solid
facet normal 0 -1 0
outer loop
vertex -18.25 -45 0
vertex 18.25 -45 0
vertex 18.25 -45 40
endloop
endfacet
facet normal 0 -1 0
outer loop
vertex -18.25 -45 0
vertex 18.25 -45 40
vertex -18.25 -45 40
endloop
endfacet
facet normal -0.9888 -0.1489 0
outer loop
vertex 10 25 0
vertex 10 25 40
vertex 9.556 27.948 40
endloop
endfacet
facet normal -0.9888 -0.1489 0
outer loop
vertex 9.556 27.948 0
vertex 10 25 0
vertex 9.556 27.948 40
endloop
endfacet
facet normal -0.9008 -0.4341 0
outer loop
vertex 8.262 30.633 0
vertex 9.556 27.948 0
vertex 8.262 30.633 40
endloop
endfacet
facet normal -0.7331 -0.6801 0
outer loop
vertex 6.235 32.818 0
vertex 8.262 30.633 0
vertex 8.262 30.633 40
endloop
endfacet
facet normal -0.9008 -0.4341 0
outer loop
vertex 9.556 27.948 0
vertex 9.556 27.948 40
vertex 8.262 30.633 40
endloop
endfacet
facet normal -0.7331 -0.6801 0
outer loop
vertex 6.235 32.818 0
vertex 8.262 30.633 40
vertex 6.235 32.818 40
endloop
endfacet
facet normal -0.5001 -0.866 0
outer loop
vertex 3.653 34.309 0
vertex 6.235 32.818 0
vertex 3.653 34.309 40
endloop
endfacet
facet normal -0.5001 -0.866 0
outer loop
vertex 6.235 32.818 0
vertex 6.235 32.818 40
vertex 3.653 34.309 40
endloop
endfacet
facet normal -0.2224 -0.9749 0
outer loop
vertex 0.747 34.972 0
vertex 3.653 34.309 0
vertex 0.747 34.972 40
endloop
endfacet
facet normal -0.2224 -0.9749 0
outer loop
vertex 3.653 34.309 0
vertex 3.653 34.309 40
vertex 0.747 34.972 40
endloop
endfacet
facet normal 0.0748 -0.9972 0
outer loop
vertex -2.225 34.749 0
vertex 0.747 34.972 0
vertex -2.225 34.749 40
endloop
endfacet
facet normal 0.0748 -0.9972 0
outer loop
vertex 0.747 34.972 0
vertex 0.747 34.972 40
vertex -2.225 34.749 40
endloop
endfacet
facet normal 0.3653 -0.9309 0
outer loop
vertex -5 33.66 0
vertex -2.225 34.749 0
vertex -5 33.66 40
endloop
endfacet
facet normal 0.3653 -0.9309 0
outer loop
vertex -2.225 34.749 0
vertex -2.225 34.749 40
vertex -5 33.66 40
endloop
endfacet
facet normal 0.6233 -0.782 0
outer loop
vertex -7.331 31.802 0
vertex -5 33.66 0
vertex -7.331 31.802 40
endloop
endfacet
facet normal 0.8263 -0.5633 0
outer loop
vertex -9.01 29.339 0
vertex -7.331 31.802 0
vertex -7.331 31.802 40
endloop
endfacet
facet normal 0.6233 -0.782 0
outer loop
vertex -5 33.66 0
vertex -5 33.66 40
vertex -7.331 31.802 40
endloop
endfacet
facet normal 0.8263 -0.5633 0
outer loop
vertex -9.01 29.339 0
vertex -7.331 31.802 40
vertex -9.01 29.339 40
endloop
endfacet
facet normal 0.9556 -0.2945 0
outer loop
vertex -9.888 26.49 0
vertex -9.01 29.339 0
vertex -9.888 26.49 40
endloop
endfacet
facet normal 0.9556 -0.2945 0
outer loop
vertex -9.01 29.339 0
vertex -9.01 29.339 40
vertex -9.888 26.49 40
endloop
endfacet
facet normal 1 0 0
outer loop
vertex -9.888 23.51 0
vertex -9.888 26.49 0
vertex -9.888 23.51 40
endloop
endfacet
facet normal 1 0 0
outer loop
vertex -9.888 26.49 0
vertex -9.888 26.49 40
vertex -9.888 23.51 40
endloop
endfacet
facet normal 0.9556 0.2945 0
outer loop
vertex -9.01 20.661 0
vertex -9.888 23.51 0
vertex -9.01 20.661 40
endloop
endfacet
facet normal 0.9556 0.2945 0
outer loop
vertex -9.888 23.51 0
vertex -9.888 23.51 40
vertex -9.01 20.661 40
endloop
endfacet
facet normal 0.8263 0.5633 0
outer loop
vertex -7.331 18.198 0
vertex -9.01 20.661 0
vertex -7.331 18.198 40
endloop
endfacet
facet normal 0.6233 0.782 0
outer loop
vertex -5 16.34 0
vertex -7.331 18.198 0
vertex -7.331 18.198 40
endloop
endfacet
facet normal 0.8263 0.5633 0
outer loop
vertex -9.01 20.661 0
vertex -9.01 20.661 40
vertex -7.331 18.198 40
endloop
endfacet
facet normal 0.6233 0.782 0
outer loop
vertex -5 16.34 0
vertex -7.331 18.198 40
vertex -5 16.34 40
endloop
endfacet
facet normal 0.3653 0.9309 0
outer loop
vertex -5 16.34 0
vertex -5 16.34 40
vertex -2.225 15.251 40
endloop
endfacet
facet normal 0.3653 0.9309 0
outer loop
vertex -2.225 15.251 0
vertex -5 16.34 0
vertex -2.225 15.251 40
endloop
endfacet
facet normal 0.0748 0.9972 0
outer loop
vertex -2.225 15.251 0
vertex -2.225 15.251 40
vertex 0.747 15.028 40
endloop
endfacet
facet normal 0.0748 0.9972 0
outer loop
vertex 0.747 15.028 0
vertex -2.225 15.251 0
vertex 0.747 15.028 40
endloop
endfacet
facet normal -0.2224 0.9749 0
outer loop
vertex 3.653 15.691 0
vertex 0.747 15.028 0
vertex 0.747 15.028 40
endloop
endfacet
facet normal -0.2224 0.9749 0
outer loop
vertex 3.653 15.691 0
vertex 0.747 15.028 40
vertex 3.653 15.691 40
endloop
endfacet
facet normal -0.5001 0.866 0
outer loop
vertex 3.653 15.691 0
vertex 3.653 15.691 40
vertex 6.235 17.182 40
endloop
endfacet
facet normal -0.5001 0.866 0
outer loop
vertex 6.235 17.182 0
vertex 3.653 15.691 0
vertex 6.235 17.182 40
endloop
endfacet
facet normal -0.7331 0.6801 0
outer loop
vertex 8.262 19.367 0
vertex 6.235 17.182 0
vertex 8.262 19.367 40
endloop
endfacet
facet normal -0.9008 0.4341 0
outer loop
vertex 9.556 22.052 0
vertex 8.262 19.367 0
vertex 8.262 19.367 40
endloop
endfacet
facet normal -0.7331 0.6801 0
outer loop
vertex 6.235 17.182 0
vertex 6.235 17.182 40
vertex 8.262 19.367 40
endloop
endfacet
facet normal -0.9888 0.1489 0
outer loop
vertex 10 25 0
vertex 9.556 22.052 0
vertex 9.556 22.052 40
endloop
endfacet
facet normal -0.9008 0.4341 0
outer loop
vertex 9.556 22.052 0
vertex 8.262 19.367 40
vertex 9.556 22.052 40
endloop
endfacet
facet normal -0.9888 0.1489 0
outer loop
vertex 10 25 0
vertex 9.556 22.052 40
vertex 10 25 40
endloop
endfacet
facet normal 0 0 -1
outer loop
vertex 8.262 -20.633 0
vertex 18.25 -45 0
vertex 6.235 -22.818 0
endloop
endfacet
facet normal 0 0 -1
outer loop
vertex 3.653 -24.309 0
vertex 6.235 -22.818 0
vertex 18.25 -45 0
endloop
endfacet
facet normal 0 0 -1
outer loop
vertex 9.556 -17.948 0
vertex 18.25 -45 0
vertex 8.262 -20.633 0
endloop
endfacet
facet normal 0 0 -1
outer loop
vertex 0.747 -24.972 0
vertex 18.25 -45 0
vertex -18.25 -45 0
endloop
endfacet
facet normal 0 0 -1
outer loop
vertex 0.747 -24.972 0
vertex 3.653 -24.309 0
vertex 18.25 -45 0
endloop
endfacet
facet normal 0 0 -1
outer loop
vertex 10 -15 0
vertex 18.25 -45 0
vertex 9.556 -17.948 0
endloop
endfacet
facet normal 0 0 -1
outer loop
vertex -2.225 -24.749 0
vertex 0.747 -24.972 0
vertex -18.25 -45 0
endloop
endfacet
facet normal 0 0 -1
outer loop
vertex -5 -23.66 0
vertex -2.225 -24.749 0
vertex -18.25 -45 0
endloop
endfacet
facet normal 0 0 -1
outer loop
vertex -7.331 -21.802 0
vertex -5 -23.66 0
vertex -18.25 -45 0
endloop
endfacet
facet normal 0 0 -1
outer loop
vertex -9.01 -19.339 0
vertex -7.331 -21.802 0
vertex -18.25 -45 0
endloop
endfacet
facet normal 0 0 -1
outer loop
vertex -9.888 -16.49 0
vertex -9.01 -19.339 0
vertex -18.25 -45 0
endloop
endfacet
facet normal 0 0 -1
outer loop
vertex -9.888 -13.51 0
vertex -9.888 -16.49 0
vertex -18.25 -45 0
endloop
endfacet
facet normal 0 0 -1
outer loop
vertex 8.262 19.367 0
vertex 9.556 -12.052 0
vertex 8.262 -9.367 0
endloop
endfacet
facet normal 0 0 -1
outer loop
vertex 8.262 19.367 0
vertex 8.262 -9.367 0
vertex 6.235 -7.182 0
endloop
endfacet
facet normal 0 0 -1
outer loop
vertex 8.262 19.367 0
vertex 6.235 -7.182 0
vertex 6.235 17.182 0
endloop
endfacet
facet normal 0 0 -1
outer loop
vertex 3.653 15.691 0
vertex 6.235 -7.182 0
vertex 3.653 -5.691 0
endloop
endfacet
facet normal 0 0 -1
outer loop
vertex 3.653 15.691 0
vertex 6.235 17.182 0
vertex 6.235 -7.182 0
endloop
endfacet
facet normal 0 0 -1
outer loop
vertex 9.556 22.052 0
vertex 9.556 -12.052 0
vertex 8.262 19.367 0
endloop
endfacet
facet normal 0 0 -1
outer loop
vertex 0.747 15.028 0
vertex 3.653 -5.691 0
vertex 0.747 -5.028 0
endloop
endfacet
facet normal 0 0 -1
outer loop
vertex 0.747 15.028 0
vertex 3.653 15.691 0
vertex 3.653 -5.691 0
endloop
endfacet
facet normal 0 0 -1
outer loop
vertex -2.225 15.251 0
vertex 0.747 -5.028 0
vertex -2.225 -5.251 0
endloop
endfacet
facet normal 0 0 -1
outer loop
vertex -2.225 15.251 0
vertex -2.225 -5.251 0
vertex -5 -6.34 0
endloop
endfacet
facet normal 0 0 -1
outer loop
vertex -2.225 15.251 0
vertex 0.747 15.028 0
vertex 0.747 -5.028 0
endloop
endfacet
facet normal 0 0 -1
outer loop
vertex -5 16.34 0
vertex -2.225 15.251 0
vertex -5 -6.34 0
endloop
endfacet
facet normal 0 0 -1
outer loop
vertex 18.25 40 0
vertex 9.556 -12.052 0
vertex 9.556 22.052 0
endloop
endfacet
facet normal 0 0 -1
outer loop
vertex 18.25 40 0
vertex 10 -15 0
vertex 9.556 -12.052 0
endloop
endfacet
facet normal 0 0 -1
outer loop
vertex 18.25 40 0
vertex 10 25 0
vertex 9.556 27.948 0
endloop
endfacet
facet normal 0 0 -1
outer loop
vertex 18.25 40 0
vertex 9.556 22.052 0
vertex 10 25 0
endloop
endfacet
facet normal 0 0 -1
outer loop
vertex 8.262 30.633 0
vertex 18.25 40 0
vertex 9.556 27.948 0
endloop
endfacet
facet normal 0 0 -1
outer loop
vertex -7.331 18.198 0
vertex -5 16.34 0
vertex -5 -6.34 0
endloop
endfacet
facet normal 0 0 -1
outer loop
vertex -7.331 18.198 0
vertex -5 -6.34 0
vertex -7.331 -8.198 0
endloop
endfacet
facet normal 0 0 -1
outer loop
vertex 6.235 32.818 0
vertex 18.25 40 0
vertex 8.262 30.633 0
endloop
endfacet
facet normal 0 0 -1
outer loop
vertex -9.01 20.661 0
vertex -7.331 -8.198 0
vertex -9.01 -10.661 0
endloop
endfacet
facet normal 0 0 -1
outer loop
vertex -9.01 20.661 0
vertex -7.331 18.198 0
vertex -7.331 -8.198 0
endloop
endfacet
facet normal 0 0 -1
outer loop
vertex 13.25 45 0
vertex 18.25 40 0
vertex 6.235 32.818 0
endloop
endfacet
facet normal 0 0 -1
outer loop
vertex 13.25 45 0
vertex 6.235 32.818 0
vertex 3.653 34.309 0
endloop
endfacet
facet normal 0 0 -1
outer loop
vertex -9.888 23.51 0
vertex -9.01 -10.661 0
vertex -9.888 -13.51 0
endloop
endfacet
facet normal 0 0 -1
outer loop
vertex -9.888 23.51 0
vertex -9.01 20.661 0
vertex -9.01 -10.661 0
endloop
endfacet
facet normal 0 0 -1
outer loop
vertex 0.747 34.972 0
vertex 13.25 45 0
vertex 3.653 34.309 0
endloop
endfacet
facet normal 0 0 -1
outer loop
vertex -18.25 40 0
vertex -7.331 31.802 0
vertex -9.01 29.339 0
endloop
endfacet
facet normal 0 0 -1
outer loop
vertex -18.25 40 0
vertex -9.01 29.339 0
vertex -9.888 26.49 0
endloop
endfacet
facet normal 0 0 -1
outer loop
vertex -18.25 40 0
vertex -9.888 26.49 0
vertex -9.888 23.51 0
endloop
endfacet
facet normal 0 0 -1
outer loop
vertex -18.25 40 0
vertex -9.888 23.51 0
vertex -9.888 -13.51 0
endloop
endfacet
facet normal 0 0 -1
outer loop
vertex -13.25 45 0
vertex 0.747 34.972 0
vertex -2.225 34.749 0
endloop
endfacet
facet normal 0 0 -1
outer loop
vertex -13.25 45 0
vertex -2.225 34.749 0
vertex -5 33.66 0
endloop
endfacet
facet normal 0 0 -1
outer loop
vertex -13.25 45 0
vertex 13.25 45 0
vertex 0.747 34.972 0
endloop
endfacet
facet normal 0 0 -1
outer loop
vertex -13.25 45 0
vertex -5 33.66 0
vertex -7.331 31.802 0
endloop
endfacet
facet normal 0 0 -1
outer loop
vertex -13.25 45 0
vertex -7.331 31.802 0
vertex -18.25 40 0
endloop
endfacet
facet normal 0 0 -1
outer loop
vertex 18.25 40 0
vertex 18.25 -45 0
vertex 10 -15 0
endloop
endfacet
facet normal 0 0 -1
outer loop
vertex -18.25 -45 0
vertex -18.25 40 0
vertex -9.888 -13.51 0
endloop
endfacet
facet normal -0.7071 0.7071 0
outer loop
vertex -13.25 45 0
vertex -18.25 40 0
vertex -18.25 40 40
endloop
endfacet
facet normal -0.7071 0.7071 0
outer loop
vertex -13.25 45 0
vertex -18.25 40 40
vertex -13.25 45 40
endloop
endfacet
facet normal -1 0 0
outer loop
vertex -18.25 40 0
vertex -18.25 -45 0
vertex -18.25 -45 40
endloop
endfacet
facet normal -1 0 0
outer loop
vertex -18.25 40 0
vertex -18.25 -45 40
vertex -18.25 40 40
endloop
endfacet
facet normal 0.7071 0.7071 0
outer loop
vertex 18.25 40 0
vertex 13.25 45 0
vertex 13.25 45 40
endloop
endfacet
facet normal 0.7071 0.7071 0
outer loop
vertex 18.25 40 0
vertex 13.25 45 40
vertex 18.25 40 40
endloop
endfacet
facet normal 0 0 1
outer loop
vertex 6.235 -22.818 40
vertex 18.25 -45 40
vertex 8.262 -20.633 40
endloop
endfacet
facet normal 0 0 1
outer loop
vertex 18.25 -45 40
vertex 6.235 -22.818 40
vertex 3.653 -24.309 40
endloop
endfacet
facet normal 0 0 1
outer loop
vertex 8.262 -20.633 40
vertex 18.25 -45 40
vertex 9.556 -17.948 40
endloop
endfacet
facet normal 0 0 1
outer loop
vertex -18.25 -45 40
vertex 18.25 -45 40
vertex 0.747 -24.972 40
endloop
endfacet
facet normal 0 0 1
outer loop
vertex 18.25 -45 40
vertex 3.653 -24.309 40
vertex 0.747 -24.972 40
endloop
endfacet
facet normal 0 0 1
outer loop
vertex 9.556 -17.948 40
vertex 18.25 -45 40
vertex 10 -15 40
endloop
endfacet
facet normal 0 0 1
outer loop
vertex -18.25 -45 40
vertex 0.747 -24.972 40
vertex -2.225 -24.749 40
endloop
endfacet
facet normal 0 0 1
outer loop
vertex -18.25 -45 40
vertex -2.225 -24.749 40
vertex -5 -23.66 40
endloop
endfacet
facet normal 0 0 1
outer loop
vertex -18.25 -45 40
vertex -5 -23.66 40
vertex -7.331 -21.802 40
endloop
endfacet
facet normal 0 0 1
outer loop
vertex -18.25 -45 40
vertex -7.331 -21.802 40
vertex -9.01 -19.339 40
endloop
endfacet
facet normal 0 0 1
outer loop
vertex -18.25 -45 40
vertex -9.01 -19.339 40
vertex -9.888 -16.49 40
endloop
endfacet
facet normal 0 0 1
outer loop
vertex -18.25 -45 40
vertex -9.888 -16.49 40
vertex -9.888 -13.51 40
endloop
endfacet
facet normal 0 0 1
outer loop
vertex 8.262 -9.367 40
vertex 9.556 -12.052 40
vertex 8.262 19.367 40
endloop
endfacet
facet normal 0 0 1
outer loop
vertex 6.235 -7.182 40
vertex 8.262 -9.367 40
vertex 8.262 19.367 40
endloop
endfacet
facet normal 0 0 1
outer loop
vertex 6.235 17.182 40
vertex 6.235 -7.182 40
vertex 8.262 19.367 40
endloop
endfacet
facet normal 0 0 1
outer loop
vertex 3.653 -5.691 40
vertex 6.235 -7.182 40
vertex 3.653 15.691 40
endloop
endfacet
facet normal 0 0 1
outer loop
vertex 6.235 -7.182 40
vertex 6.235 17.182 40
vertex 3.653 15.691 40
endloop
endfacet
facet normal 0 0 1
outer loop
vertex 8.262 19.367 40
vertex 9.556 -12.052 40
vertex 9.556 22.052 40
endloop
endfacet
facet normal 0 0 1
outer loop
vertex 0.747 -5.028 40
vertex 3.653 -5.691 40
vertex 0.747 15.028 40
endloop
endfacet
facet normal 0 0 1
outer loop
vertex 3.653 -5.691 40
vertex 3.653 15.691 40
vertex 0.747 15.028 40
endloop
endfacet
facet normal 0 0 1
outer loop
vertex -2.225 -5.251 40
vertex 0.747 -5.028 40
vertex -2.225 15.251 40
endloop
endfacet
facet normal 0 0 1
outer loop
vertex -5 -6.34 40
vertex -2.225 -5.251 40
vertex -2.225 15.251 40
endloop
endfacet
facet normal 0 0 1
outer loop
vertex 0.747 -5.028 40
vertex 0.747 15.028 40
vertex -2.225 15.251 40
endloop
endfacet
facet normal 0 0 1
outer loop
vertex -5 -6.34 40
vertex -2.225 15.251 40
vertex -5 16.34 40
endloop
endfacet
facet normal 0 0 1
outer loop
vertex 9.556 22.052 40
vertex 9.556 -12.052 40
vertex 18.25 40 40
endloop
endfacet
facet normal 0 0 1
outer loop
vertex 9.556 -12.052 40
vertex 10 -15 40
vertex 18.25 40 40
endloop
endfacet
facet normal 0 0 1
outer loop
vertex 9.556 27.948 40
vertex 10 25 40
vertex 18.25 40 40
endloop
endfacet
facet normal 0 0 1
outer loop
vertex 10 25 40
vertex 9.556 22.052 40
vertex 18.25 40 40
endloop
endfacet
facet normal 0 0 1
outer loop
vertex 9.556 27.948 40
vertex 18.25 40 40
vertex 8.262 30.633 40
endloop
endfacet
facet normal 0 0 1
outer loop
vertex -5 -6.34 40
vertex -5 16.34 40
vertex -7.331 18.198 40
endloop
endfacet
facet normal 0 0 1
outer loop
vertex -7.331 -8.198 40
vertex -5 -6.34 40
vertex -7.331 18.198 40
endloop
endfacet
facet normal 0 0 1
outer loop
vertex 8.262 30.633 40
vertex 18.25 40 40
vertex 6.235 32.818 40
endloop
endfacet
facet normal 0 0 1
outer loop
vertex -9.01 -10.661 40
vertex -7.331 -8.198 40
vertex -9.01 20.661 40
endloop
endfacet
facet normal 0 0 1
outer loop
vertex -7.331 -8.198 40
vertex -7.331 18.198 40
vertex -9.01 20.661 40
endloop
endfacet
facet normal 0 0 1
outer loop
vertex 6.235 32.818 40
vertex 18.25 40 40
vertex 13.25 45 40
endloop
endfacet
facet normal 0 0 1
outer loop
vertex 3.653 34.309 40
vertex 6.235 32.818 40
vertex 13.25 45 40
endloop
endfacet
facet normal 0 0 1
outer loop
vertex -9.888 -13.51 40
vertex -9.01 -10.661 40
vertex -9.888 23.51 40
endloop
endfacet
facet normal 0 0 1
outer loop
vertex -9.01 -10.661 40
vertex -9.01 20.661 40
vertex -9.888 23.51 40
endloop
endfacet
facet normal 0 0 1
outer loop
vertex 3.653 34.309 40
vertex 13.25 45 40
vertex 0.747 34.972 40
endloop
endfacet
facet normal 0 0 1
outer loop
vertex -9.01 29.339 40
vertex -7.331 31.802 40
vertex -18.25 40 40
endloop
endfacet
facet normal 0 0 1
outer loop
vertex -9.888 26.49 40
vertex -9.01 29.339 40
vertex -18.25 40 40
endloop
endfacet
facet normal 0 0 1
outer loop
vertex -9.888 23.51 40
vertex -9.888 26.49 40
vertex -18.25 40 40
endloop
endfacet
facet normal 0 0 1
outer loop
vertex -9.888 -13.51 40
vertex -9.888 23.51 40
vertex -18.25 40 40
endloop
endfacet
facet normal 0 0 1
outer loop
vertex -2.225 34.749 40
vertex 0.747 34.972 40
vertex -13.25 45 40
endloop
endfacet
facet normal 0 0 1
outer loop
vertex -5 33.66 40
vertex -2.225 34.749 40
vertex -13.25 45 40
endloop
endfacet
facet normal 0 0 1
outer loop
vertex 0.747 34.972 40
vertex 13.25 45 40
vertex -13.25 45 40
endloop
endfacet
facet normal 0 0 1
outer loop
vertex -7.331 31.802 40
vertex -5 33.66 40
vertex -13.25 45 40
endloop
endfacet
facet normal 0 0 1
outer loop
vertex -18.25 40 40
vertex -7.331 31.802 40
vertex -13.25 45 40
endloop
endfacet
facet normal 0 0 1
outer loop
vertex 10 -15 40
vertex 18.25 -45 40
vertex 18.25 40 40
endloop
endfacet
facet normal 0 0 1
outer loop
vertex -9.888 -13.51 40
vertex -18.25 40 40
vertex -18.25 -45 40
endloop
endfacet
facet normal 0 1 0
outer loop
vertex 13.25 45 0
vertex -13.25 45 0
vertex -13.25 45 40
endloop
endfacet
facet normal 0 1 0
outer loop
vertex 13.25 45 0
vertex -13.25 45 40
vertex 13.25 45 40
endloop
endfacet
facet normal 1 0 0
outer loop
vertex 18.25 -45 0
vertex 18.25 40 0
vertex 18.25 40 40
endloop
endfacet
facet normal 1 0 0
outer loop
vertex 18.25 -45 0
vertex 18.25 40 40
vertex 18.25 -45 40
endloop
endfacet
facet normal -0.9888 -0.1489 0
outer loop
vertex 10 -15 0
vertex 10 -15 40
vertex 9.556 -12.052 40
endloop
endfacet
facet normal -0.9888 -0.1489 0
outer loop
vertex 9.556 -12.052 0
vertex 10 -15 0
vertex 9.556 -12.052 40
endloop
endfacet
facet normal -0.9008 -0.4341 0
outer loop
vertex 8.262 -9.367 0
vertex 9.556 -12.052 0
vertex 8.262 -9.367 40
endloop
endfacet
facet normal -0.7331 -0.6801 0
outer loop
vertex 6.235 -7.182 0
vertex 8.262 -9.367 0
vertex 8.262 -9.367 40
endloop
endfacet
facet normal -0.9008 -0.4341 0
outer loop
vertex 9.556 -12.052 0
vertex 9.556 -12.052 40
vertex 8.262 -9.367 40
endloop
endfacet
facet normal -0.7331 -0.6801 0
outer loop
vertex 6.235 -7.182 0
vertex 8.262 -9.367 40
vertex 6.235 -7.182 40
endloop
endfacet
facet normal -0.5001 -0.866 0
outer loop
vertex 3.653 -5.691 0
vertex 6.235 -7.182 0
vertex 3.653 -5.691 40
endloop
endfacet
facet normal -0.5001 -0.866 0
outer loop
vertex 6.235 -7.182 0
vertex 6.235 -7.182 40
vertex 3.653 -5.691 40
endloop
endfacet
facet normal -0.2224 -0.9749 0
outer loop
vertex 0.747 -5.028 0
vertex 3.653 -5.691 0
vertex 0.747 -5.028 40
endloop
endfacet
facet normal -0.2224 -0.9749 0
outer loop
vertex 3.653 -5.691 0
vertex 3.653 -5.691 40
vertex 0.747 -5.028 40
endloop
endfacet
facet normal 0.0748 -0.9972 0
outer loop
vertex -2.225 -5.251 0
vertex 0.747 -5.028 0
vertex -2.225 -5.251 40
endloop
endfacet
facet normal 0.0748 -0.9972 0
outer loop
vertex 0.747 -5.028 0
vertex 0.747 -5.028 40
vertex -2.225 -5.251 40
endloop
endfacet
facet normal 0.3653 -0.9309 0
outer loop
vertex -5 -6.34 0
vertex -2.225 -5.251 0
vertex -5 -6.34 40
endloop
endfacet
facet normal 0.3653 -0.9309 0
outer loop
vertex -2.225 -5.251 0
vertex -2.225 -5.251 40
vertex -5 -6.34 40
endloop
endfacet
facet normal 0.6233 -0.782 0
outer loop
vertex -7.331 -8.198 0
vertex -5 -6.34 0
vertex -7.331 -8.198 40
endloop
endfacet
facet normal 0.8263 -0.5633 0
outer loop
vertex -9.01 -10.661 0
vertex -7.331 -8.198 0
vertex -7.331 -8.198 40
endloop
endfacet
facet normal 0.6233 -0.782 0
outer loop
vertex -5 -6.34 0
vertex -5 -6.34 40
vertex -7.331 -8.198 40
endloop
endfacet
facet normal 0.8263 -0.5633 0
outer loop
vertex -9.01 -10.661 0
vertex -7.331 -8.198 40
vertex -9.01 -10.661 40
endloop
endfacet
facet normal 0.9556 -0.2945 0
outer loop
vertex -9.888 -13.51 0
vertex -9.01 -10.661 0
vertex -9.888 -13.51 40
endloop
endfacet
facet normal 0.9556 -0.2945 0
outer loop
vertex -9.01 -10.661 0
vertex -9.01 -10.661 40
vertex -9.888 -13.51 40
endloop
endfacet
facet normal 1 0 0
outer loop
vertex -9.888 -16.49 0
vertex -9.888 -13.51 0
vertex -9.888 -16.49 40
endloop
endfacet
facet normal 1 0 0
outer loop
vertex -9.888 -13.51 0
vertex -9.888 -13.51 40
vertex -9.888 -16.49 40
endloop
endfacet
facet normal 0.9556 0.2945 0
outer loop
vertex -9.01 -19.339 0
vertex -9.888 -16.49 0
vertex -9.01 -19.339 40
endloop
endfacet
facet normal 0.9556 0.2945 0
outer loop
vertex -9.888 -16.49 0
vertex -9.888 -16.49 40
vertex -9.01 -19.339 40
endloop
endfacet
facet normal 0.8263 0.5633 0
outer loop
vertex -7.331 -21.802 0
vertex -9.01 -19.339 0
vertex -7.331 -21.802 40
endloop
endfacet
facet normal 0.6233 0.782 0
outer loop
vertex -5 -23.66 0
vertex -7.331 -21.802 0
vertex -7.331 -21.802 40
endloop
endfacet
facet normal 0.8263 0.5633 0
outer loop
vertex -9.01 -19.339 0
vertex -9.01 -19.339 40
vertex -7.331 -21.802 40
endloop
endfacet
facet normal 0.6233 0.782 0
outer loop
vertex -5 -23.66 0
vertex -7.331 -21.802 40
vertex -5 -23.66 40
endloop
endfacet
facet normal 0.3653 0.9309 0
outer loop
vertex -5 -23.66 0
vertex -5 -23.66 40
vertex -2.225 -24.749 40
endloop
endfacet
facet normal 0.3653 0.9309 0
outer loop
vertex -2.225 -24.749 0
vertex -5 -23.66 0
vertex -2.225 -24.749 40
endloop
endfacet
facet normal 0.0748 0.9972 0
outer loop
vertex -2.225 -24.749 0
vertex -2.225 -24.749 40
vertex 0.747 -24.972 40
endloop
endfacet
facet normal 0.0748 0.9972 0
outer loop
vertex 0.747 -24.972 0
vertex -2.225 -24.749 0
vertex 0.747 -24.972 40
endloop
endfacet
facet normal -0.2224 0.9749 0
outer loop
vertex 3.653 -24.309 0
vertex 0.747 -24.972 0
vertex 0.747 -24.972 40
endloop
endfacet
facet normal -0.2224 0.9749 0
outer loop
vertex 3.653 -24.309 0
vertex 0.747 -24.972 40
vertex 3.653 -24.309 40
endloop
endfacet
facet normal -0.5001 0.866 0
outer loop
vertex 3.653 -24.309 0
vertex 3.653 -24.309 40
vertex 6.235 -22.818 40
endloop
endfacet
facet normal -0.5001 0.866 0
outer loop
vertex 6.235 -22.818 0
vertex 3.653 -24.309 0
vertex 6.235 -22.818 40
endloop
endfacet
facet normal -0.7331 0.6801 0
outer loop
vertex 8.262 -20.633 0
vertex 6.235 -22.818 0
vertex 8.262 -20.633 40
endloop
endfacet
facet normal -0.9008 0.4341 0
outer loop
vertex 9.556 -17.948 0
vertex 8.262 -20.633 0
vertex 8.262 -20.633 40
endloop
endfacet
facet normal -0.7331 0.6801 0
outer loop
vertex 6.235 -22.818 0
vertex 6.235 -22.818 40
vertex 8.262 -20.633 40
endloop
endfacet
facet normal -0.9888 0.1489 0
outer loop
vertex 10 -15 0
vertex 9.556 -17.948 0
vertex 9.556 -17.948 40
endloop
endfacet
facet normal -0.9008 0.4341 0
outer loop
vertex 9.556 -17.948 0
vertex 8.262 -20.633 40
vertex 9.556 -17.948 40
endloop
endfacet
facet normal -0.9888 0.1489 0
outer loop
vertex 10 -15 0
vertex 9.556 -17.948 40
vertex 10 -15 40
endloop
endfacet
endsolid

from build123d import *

# Parameters (mm, degrees)
SALIENTE_EXTRUIR1_DEPTH = 40
CROQUIS2_R              = 10
CORTAR_EXTRUIR1_DEPTH   = 40


with BuildPart() as part:
    # Croquis1 → Saliente-Extruir1 (new body)
    with BuildSketch(Plane.XY):
        Polygon((-18.25, 40), (-13.25, 45), (13.25, 45), (18.25, 40), (18.25, -45), (-18.25, -45), align=None)
    extrude(amount=SALIENTE_EXTRUIR1_DEPTH)

    # Croquis2 → Cortar-Extruir1 (cut)
    with BuildSketch(Plane.XY.offset(40)):
        with Locations((0, 25)):
            Circle(CROQUIS2_R)
        with Locations((0, -15)):
            Circle(CROQUIS2_R)
    extrude(amount=-CORTAR_EXTRUIR1_DEPTH, mode=Mode.SUBTRACT)


solid = part.part
